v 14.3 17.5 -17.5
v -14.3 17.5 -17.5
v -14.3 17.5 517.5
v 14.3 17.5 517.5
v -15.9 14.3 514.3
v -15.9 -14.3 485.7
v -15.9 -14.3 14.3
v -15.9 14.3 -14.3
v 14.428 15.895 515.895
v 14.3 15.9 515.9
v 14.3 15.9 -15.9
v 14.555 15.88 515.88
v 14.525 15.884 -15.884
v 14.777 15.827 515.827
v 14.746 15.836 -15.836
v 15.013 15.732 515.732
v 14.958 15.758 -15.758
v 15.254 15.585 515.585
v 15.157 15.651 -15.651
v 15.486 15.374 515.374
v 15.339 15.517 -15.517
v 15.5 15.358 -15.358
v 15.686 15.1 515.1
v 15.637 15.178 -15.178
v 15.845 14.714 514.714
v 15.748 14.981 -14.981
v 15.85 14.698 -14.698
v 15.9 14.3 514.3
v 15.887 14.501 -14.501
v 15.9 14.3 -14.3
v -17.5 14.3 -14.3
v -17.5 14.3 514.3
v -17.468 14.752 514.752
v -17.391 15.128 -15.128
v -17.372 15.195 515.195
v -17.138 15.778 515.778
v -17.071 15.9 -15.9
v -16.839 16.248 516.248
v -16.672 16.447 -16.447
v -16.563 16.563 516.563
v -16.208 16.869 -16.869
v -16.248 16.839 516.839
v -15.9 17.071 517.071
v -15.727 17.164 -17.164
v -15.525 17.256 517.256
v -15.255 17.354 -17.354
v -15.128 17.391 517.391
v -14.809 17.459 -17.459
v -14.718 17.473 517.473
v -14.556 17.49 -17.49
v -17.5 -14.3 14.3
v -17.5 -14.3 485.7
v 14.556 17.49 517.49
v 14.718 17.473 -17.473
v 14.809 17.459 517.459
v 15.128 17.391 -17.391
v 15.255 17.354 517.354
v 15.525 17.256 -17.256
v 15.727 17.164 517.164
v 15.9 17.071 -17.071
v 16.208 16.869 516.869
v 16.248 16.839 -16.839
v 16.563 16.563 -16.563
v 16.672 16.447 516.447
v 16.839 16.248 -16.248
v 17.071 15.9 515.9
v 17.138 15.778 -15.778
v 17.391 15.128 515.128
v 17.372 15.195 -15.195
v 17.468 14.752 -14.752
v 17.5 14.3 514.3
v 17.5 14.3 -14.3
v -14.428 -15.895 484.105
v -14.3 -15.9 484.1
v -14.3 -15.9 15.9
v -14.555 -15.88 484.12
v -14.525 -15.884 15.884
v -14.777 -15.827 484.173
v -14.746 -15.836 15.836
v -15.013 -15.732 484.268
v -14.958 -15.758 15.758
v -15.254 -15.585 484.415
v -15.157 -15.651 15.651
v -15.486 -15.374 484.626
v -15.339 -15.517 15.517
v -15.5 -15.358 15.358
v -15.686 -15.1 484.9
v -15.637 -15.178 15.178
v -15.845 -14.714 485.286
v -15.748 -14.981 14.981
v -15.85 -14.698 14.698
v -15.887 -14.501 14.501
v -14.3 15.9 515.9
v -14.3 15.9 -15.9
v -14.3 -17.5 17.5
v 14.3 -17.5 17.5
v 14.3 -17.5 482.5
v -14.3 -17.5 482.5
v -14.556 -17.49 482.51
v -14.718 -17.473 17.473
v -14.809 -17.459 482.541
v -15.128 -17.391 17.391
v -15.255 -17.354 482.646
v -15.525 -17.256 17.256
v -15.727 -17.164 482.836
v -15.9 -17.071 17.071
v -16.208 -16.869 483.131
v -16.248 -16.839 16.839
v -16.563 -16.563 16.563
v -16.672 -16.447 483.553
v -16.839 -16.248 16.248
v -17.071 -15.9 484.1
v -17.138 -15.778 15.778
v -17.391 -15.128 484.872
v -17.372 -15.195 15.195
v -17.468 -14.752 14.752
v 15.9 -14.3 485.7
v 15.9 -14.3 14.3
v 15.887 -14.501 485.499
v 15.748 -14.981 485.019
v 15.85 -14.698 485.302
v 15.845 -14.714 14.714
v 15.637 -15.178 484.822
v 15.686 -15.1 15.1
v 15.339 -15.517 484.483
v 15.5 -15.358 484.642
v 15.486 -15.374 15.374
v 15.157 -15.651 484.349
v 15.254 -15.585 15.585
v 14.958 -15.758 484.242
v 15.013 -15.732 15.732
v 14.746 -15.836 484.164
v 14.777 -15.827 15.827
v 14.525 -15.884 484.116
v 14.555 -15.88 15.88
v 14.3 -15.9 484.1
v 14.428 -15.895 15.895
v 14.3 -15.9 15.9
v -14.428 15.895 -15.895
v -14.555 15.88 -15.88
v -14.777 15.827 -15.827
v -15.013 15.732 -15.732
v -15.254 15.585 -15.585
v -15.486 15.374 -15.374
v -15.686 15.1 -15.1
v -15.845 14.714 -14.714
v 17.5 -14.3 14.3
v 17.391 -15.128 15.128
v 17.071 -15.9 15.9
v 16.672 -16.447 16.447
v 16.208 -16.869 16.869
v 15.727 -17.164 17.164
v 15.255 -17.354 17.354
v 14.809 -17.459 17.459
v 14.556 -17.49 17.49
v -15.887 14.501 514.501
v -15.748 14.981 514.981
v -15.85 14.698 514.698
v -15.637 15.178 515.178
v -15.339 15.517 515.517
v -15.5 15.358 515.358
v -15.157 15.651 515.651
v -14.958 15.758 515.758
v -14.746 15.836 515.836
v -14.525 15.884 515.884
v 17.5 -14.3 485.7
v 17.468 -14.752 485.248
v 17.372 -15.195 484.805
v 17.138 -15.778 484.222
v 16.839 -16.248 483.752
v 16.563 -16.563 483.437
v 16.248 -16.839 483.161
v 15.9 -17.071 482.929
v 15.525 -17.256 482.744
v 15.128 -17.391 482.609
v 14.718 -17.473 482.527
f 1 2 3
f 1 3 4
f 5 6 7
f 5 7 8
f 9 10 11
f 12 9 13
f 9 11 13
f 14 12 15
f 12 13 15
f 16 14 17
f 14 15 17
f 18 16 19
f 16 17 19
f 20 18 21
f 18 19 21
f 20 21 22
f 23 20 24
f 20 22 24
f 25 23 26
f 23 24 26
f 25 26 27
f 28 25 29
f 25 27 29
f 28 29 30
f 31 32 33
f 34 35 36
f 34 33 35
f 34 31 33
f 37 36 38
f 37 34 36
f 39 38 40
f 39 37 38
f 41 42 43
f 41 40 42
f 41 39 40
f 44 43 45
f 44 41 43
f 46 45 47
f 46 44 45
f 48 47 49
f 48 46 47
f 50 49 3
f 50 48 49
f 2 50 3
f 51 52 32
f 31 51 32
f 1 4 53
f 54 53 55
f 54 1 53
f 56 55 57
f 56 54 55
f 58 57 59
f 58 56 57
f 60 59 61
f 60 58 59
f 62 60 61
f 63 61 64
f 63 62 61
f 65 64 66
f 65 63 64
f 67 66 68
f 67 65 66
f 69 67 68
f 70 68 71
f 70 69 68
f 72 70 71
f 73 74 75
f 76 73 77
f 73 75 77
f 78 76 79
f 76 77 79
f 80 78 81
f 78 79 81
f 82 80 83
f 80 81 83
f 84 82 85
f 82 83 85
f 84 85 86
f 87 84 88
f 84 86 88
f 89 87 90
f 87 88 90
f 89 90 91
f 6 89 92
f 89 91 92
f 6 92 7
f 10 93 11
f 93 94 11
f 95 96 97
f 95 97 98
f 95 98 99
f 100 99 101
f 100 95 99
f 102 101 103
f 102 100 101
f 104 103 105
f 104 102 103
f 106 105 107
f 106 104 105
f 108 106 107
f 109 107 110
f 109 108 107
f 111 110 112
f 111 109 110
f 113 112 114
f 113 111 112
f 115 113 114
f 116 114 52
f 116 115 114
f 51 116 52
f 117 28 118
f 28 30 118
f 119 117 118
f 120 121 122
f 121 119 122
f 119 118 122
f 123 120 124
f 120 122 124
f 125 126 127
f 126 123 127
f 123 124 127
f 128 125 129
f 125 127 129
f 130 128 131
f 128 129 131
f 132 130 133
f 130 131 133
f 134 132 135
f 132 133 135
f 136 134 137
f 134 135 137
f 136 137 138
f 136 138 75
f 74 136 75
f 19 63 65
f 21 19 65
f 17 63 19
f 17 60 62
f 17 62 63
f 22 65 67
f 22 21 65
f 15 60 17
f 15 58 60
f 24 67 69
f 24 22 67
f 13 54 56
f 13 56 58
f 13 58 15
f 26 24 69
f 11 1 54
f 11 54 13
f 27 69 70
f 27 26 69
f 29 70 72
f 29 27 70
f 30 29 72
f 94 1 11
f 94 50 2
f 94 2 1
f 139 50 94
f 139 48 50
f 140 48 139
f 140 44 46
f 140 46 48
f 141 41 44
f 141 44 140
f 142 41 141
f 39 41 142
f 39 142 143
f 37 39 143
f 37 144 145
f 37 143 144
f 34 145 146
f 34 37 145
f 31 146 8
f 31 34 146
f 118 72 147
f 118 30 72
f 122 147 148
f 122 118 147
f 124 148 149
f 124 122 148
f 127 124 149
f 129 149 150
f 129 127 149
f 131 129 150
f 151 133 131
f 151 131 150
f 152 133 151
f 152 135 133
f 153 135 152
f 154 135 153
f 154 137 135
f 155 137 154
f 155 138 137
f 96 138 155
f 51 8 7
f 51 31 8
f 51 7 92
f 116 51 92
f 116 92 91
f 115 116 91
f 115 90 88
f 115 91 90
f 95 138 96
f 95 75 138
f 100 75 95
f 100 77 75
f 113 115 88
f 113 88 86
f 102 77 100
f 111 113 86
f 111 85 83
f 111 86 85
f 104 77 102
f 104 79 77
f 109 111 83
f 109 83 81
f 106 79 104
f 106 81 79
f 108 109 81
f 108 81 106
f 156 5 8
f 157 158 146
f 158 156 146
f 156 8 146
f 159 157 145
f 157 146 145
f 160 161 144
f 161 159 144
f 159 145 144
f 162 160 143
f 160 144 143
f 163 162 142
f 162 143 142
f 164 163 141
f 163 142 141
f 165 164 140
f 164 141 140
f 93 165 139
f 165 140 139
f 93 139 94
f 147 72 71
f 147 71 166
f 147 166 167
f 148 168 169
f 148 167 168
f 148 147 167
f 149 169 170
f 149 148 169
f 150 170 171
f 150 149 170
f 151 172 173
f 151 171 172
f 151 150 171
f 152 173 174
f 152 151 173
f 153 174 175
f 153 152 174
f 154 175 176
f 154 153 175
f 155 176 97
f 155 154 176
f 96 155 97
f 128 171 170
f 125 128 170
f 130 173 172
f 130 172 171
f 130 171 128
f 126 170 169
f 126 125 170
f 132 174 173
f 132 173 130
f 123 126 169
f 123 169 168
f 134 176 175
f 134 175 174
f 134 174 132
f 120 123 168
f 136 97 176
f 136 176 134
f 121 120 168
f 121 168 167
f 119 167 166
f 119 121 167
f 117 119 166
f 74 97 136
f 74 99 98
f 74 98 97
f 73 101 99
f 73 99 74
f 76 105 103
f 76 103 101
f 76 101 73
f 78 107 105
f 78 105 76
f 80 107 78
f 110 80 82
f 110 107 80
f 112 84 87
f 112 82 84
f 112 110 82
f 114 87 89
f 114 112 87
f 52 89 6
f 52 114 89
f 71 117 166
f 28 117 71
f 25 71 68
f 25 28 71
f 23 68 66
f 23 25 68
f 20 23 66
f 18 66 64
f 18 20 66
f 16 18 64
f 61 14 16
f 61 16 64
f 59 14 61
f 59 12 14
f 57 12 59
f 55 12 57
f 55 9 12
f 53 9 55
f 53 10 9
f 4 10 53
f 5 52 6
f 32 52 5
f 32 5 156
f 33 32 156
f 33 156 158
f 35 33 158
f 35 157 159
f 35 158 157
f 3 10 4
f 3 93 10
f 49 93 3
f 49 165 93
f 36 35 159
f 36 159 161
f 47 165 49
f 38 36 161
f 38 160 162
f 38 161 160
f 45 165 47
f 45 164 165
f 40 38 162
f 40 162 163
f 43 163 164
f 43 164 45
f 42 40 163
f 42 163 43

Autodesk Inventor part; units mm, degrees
ref_plane "Start plane" through (0, 0, -17.5) normal (0, 0, 1) x (1, 0, 0)
ref_plane "End plane" through (0, 0, 517.5) normal (0, 0, 1) x (1, 0, 0)
sketch "Sketch" plane through (0, 0, 0) normal (0, 0, 1) x (1, 0, 0)
  line L0 (-17.5, -14.3) -> (-17.5, 14.3)
  line L1 (-14.3, 17.5) -> (14.3, 17.5)
  line L2 (17.5, 14.3) -> (17.5, -14.3)
  line L3 (14.3, -17.5) -> (-14.3, -17.5)
  arc A0 (-17.5, -14.3) -> (-14.3, -17.5) centre (-14.3, -14.3) ccw
  arc A1 (-14.3, 17.5) -> (-17.5, 14.3) centre (-14.3, 14.3) ccw
  arc A2 (17.5, 14.3) -> (14.3, 17.5) centre (14.3, 14.3) ccw
  arc A3 (14.3, -17.5) -> (17.5, -14.3) centre (14.3, -14.3) ccw
  arc A4 (-14.3, 15.9) -> (-15.9, 14.3) centre (-14.3, 14.3) ccw
  line L4 (-14.3, 15.9) -> (14.3, 15.9)
  arc A5 (15.9, 14.3) -> (14.3, 15.9) centre (14.3, 14.3) ccw
  line L5 (15.9, 14.3) -> (15.9, -14.3)
  arc A6 (14.3, -15.9) -> (15.9, -14.3) centre (14.3, -14.3) ccw
  line L6 (14.3, -15.9) -> (-14.3, -15.9)
  arc A7 (-15.9, -14.3) -> (-14.3, -15.9) centre (-14.3, -14.3) ccw
  line L7 (-15.9, -14.3) -> (-15.9, 14.3)
  line L8 (0, 25.4278) -> (0, -25.4278) construction
  line L9 (-25.4278, 0) -> (25.4278, 0) construction
  dimension "d7" = 3.2
  dimension "d10" = 35
  dimension "d11" = 35
  dimension "d12" = 1.6
  dimension "d15" = 17.5
  dimension "d16" = 17.5
extrude "Body" add sketch "Sketch" along normal up to surface (535 mm away) from surface at -17.5
sketch "Sketch3" plane through (0, 0, 0) normal (0, 0, 1) x (1, 0, 0)
  line L0 (0, 0) -> (10, 0)
ref_plane "Work Plane3" through (0, 0, 0) normal (0, -1, 0) x (1, 0, 0)
sketch "Sketch4" plane through (0, 0, 0) normal (0, -1, 0) x (1, 0, 0)
  line L0 (-2, -17.5) -> (12, -17.5)
  line L1 (-2, 517.5) -> (12, 517.5)
  dimension "d18" = 535
ref_plane "Work Plane4" through (17.5, 0, -17.5) normal (0, 0, -1) x (-1, 0, 0)
split "Split1" plane through (17.5, 0, -17.5) removes the side toward (0, 0, -1)
ref_plane "Work Plane5" through (0, 17.5, 517.5) normal (0, -0.7071, 0.7071) x (1, 0, 0)
split "Split2" plane through (0, 17.5, 517.5) removes the side toward (0, -0.7071, 0.7071)
ref_plane "Work Plane15" through (0, 17.5, -17.5) normal (0, -0.7071, -0.7071) x (1, 0, 0)
split "Split6" plane through (0, 17.5, -17.5) removes the side toward (0, -0.7071, -0.7071)
equation "\"d7\" = G_IR"
equation "\"d10\" = G_H"
equation "\"d11\" = G_W"
equation "\"d12\" = G_T"
equation "\"d15\" = 0.5 * d10"
equation "\"d16\" = 0.5 * d11"
equation "\"d3\" = G_L"
equation "\"G_W\" = 35"
equation "\"G_H\" = 35"
equation "\"G_T\" = 1.6"
equation "\"G_IR\" = 3.2"
equation "\"G_L\" = 535"
equation "\"G_OFFSET_START\" = 17.5"
equation "\"G_OFFSET_END\" = 17.5"
equation "\"d13\" = -G_OFFSET_START"
equation "\"d14\" = G_OFFSET_END + B_L"
equation "\"B_L\" = 500"
properties part number "AS 1163 - C350L0 35x35x1.6 SHS - 535" material "Steel, Mild"
